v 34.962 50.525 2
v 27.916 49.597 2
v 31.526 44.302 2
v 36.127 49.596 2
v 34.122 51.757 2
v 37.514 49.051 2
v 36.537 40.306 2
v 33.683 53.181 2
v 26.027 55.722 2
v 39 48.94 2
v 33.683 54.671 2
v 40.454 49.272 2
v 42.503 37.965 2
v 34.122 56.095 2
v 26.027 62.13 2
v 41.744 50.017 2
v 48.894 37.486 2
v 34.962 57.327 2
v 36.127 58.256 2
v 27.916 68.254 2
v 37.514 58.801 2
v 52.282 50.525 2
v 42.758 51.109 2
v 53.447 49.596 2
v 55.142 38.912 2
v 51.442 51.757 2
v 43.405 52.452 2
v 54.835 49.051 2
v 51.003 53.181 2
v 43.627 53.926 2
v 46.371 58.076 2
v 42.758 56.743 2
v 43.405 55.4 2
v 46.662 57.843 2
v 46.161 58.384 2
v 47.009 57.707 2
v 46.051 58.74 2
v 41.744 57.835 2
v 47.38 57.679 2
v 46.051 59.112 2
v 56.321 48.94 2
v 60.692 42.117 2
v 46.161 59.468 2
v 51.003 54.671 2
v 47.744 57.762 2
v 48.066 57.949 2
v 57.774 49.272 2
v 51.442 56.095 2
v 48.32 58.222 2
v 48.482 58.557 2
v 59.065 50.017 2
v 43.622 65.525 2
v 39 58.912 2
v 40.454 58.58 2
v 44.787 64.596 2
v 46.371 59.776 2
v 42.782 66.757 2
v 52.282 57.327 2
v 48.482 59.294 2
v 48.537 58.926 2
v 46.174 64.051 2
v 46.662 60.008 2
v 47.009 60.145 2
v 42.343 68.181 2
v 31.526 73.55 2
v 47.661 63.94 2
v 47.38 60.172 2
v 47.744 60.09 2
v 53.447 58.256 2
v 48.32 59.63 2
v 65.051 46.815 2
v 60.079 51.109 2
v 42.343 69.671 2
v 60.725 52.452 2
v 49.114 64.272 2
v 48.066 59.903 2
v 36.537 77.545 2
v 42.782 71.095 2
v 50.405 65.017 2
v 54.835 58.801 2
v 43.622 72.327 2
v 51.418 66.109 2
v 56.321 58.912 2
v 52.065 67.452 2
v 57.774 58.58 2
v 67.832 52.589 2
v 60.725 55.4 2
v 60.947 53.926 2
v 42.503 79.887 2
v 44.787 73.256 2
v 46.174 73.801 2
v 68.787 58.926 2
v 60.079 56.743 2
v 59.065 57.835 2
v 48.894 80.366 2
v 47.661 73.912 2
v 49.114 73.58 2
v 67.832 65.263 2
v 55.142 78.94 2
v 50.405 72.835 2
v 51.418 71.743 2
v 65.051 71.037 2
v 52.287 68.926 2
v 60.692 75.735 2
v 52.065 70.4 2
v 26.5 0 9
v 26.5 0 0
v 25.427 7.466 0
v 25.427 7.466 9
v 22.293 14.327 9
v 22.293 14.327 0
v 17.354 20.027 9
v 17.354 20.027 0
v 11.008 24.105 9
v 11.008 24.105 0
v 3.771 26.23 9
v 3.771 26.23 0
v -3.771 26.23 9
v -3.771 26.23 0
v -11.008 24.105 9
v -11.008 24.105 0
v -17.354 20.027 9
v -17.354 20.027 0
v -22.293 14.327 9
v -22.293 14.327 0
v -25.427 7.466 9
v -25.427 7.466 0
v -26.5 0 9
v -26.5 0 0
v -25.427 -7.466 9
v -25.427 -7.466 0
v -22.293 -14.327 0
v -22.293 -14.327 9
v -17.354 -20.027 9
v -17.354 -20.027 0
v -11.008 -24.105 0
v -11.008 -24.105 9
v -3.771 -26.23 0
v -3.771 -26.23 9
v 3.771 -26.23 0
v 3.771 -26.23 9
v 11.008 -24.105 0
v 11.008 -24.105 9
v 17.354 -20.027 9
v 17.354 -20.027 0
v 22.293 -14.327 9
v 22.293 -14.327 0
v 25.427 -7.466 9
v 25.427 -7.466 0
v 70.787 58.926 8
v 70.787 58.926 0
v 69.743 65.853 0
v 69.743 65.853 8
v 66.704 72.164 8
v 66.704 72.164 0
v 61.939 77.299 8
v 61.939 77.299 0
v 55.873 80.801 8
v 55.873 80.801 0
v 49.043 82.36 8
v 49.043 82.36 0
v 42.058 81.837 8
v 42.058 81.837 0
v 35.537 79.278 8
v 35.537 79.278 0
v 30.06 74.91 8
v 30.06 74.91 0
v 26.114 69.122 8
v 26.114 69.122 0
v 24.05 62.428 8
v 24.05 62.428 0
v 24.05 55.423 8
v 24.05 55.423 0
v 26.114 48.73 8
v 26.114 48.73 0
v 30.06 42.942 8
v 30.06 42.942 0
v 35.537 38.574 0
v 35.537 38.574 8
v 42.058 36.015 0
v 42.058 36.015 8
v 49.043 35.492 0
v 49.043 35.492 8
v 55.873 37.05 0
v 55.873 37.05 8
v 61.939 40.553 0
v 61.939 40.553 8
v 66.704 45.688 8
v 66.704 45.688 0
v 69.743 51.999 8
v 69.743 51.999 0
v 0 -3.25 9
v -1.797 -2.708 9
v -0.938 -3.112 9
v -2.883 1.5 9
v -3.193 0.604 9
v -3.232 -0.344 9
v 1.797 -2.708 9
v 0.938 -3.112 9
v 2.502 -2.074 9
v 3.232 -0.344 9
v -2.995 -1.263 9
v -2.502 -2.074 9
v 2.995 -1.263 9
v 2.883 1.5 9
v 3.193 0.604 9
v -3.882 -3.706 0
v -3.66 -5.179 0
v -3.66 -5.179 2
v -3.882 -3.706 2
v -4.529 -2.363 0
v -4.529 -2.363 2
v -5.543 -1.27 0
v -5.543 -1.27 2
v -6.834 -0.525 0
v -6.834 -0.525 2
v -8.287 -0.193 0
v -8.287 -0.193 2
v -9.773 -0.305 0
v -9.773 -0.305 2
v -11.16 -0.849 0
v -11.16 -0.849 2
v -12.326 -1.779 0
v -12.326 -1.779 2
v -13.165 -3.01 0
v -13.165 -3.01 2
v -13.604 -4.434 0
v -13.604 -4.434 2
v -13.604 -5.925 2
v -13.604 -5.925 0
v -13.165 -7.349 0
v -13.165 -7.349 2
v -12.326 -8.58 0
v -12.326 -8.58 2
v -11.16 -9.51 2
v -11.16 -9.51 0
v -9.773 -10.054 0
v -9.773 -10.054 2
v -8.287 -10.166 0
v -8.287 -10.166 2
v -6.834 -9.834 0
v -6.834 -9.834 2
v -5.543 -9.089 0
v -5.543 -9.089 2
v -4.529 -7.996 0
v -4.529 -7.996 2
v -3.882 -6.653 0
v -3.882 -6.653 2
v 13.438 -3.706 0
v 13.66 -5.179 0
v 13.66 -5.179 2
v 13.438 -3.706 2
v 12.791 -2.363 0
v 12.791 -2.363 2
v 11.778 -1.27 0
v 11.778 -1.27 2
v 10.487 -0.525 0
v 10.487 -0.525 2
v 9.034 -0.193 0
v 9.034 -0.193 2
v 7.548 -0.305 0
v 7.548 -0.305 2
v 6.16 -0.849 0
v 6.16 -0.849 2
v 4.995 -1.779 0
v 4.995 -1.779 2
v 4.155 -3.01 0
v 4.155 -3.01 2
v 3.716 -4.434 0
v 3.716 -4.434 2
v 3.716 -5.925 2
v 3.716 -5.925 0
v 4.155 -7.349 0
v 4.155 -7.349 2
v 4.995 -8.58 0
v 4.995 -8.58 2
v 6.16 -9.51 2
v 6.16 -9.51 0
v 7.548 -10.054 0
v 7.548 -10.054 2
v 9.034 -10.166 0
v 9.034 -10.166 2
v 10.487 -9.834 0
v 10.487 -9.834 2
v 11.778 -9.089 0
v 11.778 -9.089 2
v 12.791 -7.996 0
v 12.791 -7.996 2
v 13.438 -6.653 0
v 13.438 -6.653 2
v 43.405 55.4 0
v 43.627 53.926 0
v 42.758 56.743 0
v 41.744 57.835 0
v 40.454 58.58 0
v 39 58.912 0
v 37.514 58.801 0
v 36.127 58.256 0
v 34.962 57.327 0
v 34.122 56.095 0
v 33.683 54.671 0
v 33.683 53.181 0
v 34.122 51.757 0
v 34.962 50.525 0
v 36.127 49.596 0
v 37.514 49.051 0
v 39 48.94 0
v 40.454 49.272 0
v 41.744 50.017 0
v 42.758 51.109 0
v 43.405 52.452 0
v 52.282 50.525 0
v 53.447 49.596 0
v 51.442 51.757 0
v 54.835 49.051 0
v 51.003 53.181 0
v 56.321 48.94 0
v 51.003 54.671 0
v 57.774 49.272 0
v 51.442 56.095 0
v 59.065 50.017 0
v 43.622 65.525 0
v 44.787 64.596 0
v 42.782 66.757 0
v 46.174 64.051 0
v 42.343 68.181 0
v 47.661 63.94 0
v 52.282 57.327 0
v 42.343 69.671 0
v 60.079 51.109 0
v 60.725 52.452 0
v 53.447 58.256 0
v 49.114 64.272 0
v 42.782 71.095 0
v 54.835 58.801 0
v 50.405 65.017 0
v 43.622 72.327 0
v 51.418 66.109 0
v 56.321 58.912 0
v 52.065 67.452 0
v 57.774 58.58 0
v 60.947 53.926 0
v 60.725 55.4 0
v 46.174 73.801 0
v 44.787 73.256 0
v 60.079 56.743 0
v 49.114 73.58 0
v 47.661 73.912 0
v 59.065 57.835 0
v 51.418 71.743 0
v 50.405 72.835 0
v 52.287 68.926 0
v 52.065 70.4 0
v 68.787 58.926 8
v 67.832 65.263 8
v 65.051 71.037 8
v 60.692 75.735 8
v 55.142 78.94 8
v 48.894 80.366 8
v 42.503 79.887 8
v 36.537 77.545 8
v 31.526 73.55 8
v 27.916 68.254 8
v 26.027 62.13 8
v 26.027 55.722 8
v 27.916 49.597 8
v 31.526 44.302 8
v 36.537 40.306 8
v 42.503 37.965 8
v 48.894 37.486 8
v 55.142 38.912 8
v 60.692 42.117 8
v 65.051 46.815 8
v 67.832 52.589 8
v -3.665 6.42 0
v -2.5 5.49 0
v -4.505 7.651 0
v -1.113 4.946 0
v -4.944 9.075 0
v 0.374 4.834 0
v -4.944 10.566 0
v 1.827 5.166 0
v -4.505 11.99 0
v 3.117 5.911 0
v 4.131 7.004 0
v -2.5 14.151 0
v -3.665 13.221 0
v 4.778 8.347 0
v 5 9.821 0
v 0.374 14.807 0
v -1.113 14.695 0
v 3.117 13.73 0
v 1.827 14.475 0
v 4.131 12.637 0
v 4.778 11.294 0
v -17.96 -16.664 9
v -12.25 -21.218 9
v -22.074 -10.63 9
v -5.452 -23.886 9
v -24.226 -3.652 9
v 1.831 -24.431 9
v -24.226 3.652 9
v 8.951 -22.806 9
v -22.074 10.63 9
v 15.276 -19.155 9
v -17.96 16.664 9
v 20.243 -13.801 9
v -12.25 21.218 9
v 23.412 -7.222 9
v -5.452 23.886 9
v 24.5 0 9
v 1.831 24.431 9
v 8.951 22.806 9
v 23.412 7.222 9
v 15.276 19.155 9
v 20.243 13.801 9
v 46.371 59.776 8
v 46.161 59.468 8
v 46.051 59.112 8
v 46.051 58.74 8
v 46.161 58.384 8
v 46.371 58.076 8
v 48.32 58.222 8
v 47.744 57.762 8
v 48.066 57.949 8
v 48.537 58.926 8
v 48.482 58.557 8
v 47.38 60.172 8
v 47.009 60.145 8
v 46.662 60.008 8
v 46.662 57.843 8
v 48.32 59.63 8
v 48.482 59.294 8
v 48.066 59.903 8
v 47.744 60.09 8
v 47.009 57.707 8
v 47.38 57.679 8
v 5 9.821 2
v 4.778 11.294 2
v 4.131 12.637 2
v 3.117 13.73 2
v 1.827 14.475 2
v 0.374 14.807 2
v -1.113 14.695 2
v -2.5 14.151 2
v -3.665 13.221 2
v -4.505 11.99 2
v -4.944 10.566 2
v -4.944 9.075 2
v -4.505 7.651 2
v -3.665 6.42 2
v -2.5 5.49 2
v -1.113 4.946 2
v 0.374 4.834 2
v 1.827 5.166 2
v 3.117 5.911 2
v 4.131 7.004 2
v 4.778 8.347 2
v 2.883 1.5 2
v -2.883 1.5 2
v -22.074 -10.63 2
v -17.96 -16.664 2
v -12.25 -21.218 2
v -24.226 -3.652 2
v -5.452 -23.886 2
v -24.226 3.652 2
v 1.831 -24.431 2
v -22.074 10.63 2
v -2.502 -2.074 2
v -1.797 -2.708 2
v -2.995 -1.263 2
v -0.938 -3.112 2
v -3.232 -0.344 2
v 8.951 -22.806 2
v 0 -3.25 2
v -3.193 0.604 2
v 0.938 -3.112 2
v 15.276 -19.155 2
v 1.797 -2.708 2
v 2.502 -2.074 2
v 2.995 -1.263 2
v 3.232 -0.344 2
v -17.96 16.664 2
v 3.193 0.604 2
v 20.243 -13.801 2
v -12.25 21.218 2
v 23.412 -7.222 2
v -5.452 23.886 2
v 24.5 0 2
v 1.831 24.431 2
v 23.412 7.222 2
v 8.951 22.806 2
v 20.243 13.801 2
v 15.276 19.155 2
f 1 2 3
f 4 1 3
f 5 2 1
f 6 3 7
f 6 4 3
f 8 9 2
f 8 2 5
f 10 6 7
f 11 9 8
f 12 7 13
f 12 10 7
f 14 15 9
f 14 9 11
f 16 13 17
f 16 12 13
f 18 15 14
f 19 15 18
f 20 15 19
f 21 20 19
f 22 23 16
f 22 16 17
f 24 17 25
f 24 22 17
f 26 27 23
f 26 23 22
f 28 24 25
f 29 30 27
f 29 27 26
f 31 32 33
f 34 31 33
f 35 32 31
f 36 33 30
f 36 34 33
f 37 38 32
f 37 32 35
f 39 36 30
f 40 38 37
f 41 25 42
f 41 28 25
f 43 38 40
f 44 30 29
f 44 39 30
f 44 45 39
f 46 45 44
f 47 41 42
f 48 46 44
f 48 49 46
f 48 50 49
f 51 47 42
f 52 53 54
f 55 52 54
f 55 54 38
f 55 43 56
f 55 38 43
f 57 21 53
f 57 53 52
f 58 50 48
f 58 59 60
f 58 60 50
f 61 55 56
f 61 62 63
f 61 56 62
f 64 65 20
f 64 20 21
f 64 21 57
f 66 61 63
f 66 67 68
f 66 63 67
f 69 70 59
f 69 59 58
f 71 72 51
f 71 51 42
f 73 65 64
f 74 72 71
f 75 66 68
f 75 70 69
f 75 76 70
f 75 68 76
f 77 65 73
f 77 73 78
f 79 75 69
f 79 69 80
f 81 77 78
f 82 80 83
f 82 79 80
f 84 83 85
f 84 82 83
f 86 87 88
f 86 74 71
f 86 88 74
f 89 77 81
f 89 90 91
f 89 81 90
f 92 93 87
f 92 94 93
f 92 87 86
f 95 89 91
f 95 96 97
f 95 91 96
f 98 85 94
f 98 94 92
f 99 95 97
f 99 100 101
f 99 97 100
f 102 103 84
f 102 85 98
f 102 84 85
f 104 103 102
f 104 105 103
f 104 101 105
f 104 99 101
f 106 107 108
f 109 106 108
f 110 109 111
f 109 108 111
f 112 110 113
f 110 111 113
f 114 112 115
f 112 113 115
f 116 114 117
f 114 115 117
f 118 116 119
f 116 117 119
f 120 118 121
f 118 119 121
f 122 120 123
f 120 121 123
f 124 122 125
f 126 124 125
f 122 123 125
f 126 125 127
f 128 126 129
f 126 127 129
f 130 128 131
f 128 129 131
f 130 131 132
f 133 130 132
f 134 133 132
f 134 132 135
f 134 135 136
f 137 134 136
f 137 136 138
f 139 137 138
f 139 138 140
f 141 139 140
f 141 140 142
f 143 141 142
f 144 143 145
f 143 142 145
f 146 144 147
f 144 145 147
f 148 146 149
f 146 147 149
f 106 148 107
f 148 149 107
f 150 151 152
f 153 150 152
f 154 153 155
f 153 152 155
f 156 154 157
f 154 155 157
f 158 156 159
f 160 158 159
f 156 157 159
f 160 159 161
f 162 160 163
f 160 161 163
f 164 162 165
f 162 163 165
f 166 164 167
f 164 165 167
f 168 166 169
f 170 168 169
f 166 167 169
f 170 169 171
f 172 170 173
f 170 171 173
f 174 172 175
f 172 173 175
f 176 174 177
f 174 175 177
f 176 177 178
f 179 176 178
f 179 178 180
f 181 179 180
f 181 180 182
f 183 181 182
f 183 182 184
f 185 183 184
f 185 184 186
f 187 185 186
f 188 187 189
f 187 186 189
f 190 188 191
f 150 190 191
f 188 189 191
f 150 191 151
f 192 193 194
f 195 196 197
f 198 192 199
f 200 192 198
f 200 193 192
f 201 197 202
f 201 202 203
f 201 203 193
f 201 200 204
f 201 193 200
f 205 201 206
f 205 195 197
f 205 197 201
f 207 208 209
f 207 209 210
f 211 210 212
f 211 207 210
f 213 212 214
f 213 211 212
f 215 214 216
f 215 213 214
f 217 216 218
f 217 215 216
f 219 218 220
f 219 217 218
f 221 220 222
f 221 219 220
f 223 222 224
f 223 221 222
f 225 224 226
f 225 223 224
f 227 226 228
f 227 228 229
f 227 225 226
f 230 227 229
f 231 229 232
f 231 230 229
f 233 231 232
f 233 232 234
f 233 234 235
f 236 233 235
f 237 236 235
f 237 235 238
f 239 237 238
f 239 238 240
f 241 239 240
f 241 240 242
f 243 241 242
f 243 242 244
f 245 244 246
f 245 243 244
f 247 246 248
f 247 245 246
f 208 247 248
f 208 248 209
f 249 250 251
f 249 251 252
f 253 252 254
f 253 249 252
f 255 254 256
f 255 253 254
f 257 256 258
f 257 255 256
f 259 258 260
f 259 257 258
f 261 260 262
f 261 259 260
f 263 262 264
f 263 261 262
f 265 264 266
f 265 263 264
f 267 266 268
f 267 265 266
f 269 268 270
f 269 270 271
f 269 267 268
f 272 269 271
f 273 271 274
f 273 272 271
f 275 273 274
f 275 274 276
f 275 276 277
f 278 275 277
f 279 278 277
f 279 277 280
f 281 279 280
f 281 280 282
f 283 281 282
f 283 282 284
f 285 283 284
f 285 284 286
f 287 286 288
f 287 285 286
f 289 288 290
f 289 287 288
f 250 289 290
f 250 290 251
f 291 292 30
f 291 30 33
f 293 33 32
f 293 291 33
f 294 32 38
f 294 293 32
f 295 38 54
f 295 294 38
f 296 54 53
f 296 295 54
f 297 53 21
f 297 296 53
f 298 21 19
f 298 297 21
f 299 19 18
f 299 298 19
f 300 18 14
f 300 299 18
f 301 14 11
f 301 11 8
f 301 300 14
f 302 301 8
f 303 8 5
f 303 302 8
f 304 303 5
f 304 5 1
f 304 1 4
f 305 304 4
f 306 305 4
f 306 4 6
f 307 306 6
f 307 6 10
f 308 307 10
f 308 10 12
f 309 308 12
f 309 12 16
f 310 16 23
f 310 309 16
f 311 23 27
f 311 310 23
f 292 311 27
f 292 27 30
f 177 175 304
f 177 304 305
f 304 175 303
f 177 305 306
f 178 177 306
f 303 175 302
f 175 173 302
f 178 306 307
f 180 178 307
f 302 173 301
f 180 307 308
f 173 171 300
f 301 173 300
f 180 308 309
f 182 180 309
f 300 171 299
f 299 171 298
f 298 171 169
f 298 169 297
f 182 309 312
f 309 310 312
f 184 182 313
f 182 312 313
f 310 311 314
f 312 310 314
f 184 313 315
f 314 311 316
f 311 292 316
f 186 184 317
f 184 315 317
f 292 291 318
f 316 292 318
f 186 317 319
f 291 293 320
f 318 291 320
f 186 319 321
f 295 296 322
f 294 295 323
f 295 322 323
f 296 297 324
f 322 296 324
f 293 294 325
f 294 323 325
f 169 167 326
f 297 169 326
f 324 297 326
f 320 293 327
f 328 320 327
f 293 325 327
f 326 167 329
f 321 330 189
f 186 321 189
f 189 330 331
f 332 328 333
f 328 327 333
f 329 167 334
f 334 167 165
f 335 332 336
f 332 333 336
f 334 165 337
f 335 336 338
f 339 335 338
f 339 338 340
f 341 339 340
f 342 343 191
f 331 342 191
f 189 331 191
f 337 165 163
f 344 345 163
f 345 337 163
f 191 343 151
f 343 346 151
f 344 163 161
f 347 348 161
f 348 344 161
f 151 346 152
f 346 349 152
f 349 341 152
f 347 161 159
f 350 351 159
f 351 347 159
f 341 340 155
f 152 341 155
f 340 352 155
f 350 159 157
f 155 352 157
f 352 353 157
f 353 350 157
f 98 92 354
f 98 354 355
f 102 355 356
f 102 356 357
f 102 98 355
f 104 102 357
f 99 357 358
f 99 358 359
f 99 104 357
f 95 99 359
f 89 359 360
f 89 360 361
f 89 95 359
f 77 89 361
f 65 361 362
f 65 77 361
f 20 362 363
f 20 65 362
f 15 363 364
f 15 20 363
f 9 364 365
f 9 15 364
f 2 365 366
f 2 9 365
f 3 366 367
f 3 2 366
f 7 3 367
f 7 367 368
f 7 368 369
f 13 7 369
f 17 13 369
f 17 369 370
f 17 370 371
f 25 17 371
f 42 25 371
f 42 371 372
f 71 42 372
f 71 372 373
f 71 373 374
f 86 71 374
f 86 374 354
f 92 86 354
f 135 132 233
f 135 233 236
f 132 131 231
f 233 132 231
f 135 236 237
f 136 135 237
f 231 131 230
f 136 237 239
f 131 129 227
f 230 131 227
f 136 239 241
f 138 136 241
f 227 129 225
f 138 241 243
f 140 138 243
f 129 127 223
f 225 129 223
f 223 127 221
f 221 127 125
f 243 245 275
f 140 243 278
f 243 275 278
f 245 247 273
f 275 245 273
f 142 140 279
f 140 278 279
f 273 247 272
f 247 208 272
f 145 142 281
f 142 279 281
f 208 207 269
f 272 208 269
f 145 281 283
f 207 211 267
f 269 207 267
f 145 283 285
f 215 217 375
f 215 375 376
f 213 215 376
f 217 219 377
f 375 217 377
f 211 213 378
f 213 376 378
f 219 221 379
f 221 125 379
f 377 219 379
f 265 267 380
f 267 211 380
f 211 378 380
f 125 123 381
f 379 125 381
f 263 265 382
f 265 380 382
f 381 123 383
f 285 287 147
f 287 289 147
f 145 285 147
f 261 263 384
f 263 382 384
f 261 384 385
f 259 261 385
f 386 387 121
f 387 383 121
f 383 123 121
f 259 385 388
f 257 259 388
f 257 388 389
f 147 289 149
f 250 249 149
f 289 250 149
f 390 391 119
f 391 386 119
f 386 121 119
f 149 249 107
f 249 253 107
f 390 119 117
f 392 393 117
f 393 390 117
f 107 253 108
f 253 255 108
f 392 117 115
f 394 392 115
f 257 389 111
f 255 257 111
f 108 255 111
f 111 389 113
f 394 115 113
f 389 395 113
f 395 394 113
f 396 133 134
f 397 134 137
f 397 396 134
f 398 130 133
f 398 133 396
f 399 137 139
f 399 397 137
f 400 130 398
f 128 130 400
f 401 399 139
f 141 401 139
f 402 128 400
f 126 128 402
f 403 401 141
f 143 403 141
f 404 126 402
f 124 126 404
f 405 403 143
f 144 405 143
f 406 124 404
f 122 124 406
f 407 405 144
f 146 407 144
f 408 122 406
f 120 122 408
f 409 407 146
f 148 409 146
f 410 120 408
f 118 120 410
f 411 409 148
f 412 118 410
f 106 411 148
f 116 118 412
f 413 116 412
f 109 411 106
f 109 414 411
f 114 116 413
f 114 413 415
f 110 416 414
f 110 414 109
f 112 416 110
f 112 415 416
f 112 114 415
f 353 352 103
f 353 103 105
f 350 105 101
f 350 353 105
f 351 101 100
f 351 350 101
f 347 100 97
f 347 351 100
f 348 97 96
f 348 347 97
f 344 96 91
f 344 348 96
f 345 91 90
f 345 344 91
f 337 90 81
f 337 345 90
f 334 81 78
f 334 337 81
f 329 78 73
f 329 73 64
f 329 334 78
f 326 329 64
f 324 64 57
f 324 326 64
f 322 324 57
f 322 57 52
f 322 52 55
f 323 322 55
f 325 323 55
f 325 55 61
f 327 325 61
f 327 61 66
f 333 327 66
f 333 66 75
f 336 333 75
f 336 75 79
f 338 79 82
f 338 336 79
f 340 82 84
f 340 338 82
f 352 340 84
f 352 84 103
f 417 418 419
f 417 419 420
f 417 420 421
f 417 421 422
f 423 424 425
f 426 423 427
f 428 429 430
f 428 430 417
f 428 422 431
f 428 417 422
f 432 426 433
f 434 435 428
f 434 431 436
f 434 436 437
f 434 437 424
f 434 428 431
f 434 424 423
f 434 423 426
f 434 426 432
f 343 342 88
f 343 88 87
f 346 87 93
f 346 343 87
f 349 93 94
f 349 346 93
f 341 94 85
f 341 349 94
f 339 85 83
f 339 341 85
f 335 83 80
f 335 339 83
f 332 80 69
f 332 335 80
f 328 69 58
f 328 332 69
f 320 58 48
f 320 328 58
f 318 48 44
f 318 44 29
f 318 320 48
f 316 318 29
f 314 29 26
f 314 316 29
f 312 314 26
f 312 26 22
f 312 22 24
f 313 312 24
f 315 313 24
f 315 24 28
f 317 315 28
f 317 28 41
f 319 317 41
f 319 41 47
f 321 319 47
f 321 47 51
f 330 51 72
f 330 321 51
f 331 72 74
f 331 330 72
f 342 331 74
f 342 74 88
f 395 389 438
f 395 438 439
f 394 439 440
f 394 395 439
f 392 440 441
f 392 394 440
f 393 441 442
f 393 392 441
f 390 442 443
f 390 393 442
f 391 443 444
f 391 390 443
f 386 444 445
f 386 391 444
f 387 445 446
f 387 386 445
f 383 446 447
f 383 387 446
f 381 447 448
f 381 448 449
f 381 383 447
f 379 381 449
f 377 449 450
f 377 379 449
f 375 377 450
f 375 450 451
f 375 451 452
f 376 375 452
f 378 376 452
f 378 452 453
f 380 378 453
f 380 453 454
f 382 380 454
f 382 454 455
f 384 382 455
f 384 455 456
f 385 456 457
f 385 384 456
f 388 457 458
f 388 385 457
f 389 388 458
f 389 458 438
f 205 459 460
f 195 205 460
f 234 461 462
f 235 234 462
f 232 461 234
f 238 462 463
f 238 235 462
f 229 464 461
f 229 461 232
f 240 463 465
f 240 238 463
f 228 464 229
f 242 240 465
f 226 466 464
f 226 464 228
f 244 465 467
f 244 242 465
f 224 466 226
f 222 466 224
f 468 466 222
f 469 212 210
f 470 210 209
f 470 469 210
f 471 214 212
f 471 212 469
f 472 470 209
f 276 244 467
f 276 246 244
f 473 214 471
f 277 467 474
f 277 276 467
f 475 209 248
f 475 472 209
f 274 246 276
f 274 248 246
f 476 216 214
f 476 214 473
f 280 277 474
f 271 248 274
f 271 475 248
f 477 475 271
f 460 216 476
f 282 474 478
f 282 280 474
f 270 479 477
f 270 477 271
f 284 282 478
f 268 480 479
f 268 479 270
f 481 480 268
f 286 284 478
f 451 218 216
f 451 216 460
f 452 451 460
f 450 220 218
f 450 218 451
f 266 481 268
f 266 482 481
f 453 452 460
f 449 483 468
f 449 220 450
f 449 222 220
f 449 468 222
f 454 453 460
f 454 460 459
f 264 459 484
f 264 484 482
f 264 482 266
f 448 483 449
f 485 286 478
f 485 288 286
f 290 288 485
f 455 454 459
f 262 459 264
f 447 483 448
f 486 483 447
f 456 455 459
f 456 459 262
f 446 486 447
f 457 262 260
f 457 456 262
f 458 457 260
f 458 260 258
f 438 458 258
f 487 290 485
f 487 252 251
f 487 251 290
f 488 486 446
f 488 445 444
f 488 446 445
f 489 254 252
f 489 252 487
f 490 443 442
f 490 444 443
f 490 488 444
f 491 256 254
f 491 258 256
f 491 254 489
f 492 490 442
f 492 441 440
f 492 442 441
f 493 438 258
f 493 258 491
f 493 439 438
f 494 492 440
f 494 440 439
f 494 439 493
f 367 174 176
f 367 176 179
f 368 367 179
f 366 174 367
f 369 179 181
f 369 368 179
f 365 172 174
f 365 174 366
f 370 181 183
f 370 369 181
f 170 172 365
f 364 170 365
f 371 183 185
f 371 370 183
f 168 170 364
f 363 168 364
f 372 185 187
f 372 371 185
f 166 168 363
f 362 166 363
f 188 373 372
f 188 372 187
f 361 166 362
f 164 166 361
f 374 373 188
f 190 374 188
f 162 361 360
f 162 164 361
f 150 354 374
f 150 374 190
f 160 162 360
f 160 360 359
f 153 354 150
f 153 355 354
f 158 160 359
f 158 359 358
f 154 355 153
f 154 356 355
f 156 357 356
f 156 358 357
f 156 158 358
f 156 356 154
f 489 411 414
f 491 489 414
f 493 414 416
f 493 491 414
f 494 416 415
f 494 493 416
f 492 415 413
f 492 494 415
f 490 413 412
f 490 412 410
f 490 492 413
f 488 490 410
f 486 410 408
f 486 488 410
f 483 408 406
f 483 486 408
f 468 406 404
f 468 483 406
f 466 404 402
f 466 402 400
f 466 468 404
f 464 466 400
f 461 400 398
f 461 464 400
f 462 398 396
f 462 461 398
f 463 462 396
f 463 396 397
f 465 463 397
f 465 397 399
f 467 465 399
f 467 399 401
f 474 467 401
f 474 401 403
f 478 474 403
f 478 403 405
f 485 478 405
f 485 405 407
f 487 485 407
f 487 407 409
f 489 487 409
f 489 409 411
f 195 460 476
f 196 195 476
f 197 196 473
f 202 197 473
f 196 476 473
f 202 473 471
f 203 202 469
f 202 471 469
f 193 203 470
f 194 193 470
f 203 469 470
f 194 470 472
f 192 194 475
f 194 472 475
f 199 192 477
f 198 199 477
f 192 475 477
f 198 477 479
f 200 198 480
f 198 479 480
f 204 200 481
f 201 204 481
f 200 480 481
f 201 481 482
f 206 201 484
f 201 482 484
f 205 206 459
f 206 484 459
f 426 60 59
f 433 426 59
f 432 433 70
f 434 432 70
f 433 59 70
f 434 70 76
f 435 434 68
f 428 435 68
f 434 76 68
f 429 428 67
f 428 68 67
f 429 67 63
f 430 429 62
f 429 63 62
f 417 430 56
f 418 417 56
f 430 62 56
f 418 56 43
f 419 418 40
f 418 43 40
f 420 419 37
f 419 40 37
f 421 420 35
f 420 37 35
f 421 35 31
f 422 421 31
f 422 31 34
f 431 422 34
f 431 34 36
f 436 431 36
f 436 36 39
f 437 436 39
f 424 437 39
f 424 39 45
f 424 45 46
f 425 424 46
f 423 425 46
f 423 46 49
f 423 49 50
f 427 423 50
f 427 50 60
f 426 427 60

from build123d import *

# Parameters (mm, degrees)
F1_DEPTH = 9
F0_R     = 26.5
F0_R_2   = 24.5
F0_R_3   = 5
F2_DEPTH = 2
F0_R_4   = 23.5
F0_R_5   = 21.5
F5_DEPTH = 8
F0_R_6   = 1.25
F6_DEPTH = 2


with BuildPart() as f1:
    # F0 (on Top) → F1 (new body)
    with BuildSketch(Plane.XY):
        with BuildLine():
            Line((2.8831406487, 1.5), (-2.8831406487, 1.5))
            ThreePointArc((-2.8831406487, 1.5), (0, -3.25), (2.8831406487, 1.5))
        make_face()
    extrude(amount=F1_DEPTH)



with BuildPart() as f1b:
    # F0 (on Top) → F1, piece 2 (new body)
    with BuildSketch(Plane.XY):
        Circle(F0_R)
        Circle(F0_R_2, mode=Mode.SUBTRACT)
    extrude(amount=F1_DEPTH)


with BuildPart() as f1_1:
    add(f1.part)

    add(f1b.part)  # F2 merges F1b
    # F0 (on Top) → F2 (join)
    with BuildSketch(Plane.XY):
        Circle(F0_R_2)
        with Locations((-8.6602540378, -5.1794842726)):
            Circle(F0_R_3, mode=Mode.SUBTRACT)
        with BuildLine():
            ThreePointArc((2.8831406487, 1.5), (0, -3.25), (-2.8831406487, 1.5))
            Line((-2.8831406487, 1.5), (2.8831406487, 1.5))
        make_face(mode=Mode.SUBTRACT)
        with Locations((8.6602540378, -5.1794842726)):
            Circle(F0_R_3, mode=Mode.SUBTRACT)
        with Locations((0, 9.8205157274)):
            Circle(F0_R_3, mode=Mode.SUBTRACT)
    extrude(amount=F2_DEPTH)


with BuildPart() as f3_1:
    # F3: copy of F1
    add(f1_1.part)


with BuildPart() as f5:
    # F0 (on Top) → F5 (new body)
    with BuildSketch(Plane.XY):
        with Locations((47.2870729864, 58.9259437852)):
            Circle(F0_R_4)
        with Locations((47.2870729864, 58.9259437852)):
            Circle(F0_R_5, mode=Mode.SUBTRACT)
    extrude(amount=F5_DEPTH)



with BuildPart() as f5b:
    # F0 (on Top) → F5, piece 2 (new body)
    with BuildSketch(Plane.XY):
        with Locations((47.2870729864, 58.9259437852)):
            Circle(F0_R_6)
    extrude(amount=F5_DEPTH)


with BuildPart() as f5_1:
    add(f5.part)

    add(f5b.part)  # F6 merges F5b
    # F0 (on Top) → F6 (join)
    with BuildSketch(Plane.XY):
        with Locations((47.2870729864, 58.9259437852)):
            Circle(F0_R_5)
        with Locations((38.6268189485, 53.9259437852)):
            Circle(F0_R_3, mode=Mode.SUBTRACT)
        with Locations((55.9473270242, 53.9259437852)):
            Circle(F0_R_3, mode=Mode.SUBTRACT)
        with Locations((47.2870729864, 58.9259437852)):
            Circle(F0_R_6, mode=Mode.SUBTRACT)
        with Locations((47.2870729864, 68.9259437852)):
            Circle(F0_R_3, mode=Mode.SUBTRACT)
    extrude(amount=F6_DEPTH)


solid = Compound([f3_1.part, f5_1.part])
